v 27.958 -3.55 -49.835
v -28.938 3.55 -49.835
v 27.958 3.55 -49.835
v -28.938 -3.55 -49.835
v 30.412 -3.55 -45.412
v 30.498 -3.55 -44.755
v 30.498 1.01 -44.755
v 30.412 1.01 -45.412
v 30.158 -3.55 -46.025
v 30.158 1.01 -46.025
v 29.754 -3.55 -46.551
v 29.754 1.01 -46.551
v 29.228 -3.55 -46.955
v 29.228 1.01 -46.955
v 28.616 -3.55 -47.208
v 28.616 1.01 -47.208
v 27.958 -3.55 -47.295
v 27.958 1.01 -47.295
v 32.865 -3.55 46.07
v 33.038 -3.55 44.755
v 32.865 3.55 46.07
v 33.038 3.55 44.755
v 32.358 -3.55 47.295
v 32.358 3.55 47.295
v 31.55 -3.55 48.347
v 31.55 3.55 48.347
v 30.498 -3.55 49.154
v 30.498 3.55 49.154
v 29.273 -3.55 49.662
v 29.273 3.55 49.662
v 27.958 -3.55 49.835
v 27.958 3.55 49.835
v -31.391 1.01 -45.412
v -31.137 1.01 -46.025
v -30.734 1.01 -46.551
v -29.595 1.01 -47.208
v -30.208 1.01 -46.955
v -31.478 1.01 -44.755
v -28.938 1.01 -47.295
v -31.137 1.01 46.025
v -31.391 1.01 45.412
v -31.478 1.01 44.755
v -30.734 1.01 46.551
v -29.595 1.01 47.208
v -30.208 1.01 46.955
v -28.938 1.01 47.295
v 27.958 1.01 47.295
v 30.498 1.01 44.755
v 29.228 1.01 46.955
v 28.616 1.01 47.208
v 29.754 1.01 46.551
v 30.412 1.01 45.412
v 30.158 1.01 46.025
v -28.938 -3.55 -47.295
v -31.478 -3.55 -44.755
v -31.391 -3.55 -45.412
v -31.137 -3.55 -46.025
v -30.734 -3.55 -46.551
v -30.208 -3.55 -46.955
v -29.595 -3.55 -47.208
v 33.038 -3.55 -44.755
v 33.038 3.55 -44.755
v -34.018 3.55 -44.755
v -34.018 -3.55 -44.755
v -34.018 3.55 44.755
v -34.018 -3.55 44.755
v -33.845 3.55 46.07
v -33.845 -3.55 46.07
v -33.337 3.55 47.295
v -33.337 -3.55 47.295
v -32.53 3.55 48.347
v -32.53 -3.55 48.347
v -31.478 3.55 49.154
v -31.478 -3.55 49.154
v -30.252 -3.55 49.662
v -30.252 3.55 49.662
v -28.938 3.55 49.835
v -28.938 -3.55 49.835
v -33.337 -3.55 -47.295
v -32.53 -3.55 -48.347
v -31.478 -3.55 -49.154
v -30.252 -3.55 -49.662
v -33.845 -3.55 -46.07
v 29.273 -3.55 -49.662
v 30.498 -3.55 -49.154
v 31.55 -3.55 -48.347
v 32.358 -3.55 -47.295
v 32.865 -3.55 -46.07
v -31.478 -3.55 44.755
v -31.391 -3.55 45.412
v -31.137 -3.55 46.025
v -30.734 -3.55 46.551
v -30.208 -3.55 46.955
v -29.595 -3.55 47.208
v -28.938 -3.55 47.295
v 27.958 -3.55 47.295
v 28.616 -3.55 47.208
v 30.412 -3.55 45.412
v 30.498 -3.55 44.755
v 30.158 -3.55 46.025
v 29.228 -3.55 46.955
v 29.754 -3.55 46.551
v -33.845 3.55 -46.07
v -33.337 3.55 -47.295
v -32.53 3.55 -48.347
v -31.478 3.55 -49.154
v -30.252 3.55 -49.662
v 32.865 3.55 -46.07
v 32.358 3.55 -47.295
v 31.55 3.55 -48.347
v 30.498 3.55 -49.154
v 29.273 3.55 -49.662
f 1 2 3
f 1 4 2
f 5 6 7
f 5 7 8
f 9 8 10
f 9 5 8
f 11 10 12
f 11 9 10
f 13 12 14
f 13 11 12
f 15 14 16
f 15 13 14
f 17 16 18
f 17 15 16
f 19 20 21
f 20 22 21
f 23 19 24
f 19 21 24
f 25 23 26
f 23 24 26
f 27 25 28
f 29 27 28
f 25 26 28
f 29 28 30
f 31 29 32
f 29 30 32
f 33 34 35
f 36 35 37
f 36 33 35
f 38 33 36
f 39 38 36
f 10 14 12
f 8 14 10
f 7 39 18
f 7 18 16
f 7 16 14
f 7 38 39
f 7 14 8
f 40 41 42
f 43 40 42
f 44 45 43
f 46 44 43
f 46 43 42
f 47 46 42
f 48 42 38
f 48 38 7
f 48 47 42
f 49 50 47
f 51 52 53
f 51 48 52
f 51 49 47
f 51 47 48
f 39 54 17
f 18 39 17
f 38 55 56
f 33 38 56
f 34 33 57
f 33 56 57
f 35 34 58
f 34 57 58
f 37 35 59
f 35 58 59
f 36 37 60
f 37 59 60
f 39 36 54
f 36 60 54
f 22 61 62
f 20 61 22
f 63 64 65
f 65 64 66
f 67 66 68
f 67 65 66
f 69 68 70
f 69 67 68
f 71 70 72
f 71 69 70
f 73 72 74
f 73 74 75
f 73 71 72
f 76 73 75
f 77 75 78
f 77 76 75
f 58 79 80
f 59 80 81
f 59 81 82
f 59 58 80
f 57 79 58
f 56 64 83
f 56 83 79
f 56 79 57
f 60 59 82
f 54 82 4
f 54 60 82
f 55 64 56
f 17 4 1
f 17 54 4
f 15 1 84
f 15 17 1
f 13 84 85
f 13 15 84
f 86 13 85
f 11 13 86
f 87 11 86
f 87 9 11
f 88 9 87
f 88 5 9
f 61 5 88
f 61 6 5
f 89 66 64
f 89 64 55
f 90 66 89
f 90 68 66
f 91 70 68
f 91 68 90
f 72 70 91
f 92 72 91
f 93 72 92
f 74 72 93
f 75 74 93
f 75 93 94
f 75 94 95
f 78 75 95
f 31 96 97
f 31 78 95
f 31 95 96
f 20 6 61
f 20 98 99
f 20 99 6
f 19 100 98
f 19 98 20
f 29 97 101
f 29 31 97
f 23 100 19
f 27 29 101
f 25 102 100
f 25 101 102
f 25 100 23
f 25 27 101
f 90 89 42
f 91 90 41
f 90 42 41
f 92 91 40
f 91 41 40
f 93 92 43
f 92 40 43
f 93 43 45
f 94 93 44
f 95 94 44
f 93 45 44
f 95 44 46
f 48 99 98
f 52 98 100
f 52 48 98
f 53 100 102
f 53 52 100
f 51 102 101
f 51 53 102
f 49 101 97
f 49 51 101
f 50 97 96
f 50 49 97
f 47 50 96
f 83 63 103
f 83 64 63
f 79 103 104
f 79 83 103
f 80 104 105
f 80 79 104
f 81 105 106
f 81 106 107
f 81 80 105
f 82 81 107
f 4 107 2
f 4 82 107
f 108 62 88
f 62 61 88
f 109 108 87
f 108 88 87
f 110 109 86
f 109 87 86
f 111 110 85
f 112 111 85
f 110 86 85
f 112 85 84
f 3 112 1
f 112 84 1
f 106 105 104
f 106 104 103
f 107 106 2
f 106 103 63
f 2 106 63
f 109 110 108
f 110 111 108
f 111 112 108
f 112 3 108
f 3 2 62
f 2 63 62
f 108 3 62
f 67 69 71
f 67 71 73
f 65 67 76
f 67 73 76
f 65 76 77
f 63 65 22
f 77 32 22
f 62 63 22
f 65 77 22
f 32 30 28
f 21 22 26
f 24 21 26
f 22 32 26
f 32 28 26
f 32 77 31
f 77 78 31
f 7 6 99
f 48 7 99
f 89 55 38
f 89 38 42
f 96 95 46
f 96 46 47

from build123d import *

# Parameters (mm, degrees)
F0_W     = 67.056006
F0_H     = 99.669606
F1_DEPTH = 3.55
F2_R     = 5.08
F3_T     = -2.54


with BuildPart() as f1:
    # F0 (on Front) → F1 (new body, symmetric)
    with BuildSketch(Plane.XZ):
        with Locations((-0.489677, 0)):
            Rectangle(F0_W, F0_H)
    extrude(amount=F1_DEPTH, both=True)

    # F2
    f2_edges = [f1.edges().sort_by_distance(p)[0] for p in [
        (-34.01768, 0, -49.834803),
        (-34.01768, 0, 49.834803),
        (33.038326, 0, -49.834803),
        (33.038326, 0, 49.834803),
    ]]
    fillet(f2_edges, radius=F2_R)

    # F3
    f3_openings = [f1.faces().sort_by_distance(p)[0] for p in [
        (-0.489677, -3.55, 0),
    ]]
    offset(amount=F3_T, openings=f3_openings)


solid = f1.part
